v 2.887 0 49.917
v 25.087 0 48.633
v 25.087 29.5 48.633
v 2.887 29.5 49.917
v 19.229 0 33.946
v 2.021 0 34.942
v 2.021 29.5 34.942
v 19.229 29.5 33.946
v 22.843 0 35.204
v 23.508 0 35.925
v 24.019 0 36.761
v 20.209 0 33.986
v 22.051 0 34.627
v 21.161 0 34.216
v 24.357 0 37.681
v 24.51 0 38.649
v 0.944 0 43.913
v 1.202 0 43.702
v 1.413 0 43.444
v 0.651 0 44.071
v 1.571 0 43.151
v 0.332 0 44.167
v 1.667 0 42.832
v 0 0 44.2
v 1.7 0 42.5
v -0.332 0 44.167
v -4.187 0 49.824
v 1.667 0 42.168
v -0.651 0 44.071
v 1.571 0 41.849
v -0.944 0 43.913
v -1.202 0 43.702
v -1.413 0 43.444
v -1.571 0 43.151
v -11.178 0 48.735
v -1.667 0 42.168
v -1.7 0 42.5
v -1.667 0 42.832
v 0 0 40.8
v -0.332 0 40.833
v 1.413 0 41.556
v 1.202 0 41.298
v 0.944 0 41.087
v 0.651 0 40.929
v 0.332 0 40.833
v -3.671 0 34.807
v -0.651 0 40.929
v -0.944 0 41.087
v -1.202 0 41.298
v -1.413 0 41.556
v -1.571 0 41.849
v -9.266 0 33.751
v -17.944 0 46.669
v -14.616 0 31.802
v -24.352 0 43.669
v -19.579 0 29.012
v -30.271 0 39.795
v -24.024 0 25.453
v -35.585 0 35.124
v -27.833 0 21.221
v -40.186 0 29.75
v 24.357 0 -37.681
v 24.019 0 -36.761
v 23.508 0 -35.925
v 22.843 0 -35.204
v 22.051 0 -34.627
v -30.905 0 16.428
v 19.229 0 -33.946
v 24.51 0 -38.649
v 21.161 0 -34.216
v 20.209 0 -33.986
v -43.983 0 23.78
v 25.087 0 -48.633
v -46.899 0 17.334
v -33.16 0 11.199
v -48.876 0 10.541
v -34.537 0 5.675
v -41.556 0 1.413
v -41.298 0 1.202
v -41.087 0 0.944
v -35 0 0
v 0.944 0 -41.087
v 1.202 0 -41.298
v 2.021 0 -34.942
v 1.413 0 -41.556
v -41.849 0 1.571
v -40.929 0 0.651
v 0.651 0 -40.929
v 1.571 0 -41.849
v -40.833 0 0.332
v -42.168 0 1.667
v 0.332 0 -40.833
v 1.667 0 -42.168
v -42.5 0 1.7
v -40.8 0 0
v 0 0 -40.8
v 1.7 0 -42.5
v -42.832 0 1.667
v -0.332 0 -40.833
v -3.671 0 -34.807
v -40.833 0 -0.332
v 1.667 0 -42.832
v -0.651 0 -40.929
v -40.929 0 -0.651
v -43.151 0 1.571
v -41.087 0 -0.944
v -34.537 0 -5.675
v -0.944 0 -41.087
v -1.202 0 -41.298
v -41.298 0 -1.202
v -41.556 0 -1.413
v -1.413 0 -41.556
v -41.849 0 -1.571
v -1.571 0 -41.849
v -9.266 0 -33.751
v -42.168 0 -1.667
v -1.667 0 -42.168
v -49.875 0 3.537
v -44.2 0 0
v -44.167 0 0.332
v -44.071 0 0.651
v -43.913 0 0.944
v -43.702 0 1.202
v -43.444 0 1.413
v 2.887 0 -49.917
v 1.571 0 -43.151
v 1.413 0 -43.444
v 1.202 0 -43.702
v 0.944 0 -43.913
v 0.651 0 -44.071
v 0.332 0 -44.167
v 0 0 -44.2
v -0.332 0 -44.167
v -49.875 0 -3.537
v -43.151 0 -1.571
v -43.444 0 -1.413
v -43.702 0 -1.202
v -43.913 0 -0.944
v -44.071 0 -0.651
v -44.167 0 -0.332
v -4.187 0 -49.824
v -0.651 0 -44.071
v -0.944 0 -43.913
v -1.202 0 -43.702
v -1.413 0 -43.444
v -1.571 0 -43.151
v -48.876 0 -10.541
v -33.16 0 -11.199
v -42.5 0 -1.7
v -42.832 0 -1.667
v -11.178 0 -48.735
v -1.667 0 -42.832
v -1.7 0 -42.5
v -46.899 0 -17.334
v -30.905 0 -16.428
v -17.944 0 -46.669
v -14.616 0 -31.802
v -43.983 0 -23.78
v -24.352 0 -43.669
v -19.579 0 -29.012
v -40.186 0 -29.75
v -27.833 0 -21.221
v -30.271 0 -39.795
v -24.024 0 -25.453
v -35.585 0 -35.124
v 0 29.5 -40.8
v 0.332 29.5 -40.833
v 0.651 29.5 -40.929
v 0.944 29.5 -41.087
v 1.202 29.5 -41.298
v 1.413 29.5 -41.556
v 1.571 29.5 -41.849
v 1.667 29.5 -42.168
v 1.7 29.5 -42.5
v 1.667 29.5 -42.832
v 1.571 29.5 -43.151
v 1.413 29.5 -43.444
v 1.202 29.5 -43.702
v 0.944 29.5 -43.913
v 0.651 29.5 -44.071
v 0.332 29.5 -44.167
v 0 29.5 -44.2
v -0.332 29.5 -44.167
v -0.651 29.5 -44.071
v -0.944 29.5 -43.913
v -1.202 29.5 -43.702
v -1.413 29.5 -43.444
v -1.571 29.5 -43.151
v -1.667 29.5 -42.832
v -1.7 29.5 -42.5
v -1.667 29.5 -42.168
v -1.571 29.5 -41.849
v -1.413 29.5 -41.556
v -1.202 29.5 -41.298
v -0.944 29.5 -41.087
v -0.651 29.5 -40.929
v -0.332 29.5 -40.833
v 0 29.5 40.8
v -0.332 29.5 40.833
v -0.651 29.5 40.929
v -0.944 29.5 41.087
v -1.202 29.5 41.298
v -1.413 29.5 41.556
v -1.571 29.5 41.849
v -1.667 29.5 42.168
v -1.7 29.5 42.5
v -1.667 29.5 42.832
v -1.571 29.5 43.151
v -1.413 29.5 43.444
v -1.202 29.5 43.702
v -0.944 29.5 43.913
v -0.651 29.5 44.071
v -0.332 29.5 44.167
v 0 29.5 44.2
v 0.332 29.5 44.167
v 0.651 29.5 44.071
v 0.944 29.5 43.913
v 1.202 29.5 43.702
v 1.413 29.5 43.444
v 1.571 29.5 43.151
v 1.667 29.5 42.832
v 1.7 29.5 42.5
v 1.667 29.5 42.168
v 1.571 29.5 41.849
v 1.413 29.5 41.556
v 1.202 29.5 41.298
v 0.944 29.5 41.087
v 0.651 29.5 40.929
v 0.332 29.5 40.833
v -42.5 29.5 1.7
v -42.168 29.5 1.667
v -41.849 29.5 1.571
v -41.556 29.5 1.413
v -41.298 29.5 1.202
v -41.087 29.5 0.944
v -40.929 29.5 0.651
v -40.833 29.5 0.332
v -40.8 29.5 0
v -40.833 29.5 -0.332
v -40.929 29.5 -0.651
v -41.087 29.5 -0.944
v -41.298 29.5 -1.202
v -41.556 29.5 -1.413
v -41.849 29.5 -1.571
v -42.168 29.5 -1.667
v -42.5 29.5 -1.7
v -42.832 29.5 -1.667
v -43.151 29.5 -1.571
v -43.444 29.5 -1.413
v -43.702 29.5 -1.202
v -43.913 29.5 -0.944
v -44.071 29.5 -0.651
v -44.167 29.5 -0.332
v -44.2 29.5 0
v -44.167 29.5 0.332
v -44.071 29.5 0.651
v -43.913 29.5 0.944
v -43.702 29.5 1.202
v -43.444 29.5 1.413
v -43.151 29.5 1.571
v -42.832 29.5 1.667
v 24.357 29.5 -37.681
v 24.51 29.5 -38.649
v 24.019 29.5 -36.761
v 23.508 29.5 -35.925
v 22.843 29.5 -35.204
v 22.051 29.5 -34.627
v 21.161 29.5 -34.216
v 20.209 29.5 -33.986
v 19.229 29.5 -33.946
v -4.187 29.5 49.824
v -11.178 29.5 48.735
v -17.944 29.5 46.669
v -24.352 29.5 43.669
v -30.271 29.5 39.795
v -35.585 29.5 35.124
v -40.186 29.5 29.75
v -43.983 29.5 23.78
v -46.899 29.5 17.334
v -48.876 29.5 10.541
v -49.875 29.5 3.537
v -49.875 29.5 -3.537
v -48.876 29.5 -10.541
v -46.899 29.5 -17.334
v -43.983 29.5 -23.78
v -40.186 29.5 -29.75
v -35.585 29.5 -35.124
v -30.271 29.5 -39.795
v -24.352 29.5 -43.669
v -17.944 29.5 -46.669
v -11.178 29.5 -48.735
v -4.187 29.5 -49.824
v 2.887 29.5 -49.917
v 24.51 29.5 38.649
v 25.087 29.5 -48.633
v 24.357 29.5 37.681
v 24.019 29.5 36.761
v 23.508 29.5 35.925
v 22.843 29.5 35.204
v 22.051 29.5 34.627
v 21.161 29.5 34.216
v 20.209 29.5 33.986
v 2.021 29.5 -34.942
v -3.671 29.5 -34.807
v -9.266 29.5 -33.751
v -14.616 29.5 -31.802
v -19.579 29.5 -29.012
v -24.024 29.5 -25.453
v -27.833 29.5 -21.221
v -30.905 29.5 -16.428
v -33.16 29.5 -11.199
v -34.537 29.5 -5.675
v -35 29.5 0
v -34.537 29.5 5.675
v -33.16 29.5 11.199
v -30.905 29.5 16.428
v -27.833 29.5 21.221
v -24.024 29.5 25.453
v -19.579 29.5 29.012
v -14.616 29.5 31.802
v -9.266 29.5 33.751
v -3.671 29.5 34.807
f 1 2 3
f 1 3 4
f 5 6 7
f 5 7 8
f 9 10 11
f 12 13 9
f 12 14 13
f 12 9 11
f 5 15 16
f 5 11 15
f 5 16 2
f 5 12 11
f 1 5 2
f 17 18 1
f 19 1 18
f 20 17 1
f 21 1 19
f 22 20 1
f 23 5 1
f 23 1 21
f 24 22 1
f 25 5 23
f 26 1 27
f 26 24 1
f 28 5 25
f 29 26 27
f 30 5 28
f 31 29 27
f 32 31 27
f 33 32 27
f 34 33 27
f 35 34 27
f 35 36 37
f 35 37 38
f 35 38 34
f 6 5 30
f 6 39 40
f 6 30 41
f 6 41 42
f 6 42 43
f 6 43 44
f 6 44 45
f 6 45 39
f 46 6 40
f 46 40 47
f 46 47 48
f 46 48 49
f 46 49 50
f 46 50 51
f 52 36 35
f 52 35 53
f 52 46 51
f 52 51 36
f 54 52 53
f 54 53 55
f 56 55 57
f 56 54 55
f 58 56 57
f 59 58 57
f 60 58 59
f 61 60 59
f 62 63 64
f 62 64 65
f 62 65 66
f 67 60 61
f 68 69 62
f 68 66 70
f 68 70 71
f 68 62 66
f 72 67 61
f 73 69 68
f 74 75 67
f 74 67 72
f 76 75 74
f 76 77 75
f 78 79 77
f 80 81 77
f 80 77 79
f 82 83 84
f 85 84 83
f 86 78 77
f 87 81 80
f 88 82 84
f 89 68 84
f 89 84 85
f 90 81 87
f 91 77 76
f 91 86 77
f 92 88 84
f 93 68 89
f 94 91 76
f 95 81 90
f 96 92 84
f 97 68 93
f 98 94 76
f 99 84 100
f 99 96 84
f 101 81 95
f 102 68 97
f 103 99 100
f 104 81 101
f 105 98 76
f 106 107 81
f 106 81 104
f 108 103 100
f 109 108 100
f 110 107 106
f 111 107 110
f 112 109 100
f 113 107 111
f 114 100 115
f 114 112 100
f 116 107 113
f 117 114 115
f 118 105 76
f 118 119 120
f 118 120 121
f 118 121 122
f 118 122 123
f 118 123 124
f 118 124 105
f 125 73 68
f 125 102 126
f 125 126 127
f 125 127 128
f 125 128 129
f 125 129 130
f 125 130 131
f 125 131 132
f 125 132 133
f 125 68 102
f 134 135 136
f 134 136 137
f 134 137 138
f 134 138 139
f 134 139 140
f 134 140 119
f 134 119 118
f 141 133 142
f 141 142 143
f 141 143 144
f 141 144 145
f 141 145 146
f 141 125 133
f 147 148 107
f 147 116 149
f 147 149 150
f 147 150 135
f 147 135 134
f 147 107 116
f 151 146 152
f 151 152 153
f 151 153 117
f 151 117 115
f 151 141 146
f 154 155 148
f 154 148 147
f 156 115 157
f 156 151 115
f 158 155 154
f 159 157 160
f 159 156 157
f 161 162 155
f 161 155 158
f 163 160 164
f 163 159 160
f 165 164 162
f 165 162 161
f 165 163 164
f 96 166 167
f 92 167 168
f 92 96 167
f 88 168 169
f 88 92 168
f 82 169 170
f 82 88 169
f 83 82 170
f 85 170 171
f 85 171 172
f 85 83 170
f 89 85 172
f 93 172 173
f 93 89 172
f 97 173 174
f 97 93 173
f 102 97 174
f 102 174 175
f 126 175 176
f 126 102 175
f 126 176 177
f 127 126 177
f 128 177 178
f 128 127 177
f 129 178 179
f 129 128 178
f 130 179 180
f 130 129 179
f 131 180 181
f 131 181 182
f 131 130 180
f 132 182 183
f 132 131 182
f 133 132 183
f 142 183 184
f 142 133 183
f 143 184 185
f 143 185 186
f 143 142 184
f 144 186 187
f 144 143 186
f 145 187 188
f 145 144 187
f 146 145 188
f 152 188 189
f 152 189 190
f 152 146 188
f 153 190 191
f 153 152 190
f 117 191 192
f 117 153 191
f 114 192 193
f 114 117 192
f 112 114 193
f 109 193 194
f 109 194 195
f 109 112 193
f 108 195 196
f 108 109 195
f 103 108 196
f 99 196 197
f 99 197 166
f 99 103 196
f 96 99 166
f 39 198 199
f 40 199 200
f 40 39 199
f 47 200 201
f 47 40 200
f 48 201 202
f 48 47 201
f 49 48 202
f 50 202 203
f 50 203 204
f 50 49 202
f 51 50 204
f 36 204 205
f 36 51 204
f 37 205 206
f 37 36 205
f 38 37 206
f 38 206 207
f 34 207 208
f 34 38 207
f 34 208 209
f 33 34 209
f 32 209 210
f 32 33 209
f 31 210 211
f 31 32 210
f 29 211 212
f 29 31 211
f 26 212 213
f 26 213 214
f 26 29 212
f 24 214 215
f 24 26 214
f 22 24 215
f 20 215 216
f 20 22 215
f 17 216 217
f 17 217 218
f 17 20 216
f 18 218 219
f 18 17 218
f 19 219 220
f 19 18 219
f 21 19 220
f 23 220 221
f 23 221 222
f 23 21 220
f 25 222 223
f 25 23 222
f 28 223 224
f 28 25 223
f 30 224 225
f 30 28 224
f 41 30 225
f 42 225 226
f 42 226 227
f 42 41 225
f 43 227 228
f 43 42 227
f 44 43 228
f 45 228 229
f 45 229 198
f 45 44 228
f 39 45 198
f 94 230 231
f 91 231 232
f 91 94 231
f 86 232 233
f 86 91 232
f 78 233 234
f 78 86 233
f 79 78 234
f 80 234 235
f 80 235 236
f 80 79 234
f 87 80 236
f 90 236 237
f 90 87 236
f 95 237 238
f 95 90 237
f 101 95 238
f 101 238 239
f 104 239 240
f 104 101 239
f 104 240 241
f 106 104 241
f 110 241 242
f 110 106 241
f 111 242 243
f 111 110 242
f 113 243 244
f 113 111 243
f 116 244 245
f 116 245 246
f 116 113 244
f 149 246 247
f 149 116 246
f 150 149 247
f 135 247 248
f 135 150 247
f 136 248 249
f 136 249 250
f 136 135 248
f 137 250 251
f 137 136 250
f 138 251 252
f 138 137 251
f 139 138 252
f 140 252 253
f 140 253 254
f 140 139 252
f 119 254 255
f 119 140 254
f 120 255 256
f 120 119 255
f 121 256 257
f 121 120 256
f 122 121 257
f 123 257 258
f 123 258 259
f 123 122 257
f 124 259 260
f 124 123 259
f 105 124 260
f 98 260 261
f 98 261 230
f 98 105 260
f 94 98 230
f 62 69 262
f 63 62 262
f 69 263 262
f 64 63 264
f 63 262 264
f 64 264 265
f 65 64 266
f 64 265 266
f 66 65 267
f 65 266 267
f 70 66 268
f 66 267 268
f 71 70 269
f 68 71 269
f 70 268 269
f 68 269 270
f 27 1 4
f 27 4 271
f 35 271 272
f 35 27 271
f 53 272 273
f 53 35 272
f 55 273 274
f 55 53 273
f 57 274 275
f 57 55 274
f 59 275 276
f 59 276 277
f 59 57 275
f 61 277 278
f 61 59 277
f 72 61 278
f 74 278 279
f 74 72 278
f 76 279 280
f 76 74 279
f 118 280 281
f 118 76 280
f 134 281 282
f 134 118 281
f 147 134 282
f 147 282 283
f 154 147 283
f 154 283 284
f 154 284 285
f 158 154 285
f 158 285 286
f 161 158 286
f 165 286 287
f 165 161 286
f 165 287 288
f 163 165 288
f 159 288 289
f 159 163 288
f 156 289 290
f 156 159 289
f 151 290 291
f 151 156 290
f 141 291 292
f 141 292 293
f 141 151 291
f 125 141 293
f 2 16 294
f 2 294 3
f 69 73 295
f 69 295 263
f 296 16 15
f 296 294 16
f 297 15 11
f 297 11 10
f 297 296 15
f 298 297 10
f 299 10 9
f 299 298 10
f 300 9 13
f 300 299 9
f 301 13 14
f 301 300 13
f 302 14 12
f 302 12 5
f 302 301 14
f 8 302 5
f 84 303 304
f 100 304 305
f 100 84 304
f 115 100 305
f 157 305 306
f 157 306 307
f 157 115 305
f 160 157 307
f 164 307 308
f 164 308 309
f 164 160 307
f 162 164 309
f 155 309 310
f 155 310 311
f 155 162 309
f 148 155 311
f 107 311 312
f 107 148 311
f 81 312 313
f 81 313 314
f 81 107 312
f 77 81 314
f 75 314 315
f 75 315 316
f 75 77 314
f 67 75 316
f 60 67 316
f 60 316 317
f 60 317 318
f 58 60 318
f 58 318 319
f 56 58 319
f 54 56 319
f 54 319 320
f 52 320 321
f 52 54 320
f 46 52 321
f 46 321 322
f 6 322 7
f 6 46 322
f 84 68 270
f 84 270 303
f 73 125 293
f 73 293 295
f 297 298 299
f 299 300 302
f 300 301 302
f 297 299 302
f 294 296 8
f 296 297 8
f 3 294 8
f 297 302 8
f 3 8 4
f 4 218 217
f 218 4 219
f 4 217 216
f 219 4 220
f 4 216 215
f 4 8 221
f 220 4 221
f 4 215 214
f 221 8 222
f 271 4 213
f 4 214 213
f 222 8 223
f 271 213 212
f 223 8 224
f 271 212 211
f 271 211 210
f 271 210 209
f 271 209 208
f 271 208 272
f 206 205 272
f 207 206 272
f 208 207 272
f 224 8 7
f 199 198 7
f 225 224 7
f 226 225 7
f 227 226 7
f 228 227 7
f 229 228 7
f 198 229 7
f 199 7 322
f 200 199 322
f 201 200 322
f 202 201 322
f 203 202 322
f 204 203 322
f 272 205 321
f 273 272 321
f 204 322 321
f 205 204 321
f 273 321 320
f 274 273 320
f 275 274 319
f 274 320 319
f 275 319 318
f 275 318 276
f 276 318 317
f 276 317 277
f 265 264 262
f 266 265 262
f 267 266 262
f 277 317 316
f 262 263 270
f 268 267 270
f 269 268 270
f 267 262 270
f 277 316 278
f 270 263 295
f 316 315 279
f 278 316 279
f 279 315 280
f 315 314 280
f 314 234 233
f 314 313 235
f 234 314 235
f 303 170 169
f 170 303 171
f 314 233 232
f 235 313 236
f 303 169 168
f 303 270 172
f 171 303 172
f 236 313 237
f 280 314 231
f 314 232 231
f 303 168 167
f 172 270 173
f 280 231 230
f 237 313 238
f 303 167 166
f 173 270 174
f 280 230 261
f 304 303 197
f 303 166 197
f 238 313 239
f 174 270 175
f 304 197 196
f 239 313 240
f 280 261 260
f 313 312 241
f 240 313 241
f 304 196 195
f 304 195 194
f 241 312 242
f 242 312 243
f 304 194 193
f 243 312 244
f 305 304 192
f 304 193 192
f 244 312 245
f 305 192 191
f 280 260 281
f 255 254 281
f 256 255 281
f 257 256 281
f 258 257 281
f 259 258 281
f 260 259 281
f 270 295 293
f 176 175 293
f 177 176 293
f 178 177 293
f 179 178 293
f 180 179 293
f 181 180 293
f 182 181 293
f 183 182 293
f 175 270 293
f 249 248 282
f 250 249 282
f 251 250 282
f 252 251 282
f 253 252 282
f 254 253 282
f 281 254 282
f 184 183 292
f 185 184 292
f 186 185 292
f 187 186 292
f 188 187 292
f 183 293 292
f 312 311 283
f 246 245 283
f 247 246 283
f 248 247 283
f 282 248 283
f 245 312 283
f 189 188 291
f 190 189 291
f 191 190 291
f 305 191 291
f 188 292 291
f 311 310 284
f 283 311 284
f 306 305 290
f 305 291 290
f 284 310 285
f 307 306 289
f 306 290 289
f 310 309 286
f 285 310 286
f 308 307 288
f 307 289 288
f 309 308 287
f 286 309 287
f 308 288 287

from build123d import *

# Parameters (mm, degrees)
SKETCH2_R           = 1.7
BOSS_EXTRUDE1_DEPTH = 29.5
FILLET2_R           = 5


with BuildPart() as part:
    # Sketch2 → Boss-Extrude1 (new body)
    with BuildSketch(Plane(origin=(0, 0, 0), x_dir=(1, 0, 0), z_dir=(0, 1, 0))):
        with BuildLine():
            Line((2.88691348, 49.91658773), (25.08691348, 48.632656232))
            Line((25.08691348, 48.632656232), (24.220839436, 33.657679913))
            Line((24.220839436, 33.657679913), (2.020839436, 34.941611411))
            ThreePointArc((2.020839436, 34.941611411), (-35, 0), (2.020839436, -34.941611411))
            Line((2.020839436, -34.941611411), (24.220839436, -33.657679913))
            Line((24.220839436, -33.657679913), (25.08691348, -48.632656232))
            Line((25.08691348, -48.632656232), (2.88691348, -49.91658773))
            ThreePointArc((2.88691348, -49.91658773), (-50, 0), (2.88691348, 49.91658773))
        make_face()
        with Locations(Location((-42.5, 0, 0), (0, 0, 270))):
            Circle(SKETCH2_R, mode=Mode.SUBTRACT)
        with Locations(Location((0, 42.5, 0), (0, 0, 270))):
            Circle(SKETCH2_R, mode=Mode.SUBTRACT)
        with Locations(Location((0, -42.5, 0), (0, 0, 90))):
            Circle(SKETCH2_R, mode=Mode.SUBTRACT)
    extrude(amount=BOSS_EXTRUDE1_DEPTH)

    # Fillet2
    fillet2_edges = [part.edges().sort_by_distance(p)[0] for p in [
        (24.220839436, 14.75, -33.657679913),
        (24.220839436, 14.75, 33.657679913),
    ]]
    fillet(fillet2_edges, radius=FILLET2_R)


solid = part.part
